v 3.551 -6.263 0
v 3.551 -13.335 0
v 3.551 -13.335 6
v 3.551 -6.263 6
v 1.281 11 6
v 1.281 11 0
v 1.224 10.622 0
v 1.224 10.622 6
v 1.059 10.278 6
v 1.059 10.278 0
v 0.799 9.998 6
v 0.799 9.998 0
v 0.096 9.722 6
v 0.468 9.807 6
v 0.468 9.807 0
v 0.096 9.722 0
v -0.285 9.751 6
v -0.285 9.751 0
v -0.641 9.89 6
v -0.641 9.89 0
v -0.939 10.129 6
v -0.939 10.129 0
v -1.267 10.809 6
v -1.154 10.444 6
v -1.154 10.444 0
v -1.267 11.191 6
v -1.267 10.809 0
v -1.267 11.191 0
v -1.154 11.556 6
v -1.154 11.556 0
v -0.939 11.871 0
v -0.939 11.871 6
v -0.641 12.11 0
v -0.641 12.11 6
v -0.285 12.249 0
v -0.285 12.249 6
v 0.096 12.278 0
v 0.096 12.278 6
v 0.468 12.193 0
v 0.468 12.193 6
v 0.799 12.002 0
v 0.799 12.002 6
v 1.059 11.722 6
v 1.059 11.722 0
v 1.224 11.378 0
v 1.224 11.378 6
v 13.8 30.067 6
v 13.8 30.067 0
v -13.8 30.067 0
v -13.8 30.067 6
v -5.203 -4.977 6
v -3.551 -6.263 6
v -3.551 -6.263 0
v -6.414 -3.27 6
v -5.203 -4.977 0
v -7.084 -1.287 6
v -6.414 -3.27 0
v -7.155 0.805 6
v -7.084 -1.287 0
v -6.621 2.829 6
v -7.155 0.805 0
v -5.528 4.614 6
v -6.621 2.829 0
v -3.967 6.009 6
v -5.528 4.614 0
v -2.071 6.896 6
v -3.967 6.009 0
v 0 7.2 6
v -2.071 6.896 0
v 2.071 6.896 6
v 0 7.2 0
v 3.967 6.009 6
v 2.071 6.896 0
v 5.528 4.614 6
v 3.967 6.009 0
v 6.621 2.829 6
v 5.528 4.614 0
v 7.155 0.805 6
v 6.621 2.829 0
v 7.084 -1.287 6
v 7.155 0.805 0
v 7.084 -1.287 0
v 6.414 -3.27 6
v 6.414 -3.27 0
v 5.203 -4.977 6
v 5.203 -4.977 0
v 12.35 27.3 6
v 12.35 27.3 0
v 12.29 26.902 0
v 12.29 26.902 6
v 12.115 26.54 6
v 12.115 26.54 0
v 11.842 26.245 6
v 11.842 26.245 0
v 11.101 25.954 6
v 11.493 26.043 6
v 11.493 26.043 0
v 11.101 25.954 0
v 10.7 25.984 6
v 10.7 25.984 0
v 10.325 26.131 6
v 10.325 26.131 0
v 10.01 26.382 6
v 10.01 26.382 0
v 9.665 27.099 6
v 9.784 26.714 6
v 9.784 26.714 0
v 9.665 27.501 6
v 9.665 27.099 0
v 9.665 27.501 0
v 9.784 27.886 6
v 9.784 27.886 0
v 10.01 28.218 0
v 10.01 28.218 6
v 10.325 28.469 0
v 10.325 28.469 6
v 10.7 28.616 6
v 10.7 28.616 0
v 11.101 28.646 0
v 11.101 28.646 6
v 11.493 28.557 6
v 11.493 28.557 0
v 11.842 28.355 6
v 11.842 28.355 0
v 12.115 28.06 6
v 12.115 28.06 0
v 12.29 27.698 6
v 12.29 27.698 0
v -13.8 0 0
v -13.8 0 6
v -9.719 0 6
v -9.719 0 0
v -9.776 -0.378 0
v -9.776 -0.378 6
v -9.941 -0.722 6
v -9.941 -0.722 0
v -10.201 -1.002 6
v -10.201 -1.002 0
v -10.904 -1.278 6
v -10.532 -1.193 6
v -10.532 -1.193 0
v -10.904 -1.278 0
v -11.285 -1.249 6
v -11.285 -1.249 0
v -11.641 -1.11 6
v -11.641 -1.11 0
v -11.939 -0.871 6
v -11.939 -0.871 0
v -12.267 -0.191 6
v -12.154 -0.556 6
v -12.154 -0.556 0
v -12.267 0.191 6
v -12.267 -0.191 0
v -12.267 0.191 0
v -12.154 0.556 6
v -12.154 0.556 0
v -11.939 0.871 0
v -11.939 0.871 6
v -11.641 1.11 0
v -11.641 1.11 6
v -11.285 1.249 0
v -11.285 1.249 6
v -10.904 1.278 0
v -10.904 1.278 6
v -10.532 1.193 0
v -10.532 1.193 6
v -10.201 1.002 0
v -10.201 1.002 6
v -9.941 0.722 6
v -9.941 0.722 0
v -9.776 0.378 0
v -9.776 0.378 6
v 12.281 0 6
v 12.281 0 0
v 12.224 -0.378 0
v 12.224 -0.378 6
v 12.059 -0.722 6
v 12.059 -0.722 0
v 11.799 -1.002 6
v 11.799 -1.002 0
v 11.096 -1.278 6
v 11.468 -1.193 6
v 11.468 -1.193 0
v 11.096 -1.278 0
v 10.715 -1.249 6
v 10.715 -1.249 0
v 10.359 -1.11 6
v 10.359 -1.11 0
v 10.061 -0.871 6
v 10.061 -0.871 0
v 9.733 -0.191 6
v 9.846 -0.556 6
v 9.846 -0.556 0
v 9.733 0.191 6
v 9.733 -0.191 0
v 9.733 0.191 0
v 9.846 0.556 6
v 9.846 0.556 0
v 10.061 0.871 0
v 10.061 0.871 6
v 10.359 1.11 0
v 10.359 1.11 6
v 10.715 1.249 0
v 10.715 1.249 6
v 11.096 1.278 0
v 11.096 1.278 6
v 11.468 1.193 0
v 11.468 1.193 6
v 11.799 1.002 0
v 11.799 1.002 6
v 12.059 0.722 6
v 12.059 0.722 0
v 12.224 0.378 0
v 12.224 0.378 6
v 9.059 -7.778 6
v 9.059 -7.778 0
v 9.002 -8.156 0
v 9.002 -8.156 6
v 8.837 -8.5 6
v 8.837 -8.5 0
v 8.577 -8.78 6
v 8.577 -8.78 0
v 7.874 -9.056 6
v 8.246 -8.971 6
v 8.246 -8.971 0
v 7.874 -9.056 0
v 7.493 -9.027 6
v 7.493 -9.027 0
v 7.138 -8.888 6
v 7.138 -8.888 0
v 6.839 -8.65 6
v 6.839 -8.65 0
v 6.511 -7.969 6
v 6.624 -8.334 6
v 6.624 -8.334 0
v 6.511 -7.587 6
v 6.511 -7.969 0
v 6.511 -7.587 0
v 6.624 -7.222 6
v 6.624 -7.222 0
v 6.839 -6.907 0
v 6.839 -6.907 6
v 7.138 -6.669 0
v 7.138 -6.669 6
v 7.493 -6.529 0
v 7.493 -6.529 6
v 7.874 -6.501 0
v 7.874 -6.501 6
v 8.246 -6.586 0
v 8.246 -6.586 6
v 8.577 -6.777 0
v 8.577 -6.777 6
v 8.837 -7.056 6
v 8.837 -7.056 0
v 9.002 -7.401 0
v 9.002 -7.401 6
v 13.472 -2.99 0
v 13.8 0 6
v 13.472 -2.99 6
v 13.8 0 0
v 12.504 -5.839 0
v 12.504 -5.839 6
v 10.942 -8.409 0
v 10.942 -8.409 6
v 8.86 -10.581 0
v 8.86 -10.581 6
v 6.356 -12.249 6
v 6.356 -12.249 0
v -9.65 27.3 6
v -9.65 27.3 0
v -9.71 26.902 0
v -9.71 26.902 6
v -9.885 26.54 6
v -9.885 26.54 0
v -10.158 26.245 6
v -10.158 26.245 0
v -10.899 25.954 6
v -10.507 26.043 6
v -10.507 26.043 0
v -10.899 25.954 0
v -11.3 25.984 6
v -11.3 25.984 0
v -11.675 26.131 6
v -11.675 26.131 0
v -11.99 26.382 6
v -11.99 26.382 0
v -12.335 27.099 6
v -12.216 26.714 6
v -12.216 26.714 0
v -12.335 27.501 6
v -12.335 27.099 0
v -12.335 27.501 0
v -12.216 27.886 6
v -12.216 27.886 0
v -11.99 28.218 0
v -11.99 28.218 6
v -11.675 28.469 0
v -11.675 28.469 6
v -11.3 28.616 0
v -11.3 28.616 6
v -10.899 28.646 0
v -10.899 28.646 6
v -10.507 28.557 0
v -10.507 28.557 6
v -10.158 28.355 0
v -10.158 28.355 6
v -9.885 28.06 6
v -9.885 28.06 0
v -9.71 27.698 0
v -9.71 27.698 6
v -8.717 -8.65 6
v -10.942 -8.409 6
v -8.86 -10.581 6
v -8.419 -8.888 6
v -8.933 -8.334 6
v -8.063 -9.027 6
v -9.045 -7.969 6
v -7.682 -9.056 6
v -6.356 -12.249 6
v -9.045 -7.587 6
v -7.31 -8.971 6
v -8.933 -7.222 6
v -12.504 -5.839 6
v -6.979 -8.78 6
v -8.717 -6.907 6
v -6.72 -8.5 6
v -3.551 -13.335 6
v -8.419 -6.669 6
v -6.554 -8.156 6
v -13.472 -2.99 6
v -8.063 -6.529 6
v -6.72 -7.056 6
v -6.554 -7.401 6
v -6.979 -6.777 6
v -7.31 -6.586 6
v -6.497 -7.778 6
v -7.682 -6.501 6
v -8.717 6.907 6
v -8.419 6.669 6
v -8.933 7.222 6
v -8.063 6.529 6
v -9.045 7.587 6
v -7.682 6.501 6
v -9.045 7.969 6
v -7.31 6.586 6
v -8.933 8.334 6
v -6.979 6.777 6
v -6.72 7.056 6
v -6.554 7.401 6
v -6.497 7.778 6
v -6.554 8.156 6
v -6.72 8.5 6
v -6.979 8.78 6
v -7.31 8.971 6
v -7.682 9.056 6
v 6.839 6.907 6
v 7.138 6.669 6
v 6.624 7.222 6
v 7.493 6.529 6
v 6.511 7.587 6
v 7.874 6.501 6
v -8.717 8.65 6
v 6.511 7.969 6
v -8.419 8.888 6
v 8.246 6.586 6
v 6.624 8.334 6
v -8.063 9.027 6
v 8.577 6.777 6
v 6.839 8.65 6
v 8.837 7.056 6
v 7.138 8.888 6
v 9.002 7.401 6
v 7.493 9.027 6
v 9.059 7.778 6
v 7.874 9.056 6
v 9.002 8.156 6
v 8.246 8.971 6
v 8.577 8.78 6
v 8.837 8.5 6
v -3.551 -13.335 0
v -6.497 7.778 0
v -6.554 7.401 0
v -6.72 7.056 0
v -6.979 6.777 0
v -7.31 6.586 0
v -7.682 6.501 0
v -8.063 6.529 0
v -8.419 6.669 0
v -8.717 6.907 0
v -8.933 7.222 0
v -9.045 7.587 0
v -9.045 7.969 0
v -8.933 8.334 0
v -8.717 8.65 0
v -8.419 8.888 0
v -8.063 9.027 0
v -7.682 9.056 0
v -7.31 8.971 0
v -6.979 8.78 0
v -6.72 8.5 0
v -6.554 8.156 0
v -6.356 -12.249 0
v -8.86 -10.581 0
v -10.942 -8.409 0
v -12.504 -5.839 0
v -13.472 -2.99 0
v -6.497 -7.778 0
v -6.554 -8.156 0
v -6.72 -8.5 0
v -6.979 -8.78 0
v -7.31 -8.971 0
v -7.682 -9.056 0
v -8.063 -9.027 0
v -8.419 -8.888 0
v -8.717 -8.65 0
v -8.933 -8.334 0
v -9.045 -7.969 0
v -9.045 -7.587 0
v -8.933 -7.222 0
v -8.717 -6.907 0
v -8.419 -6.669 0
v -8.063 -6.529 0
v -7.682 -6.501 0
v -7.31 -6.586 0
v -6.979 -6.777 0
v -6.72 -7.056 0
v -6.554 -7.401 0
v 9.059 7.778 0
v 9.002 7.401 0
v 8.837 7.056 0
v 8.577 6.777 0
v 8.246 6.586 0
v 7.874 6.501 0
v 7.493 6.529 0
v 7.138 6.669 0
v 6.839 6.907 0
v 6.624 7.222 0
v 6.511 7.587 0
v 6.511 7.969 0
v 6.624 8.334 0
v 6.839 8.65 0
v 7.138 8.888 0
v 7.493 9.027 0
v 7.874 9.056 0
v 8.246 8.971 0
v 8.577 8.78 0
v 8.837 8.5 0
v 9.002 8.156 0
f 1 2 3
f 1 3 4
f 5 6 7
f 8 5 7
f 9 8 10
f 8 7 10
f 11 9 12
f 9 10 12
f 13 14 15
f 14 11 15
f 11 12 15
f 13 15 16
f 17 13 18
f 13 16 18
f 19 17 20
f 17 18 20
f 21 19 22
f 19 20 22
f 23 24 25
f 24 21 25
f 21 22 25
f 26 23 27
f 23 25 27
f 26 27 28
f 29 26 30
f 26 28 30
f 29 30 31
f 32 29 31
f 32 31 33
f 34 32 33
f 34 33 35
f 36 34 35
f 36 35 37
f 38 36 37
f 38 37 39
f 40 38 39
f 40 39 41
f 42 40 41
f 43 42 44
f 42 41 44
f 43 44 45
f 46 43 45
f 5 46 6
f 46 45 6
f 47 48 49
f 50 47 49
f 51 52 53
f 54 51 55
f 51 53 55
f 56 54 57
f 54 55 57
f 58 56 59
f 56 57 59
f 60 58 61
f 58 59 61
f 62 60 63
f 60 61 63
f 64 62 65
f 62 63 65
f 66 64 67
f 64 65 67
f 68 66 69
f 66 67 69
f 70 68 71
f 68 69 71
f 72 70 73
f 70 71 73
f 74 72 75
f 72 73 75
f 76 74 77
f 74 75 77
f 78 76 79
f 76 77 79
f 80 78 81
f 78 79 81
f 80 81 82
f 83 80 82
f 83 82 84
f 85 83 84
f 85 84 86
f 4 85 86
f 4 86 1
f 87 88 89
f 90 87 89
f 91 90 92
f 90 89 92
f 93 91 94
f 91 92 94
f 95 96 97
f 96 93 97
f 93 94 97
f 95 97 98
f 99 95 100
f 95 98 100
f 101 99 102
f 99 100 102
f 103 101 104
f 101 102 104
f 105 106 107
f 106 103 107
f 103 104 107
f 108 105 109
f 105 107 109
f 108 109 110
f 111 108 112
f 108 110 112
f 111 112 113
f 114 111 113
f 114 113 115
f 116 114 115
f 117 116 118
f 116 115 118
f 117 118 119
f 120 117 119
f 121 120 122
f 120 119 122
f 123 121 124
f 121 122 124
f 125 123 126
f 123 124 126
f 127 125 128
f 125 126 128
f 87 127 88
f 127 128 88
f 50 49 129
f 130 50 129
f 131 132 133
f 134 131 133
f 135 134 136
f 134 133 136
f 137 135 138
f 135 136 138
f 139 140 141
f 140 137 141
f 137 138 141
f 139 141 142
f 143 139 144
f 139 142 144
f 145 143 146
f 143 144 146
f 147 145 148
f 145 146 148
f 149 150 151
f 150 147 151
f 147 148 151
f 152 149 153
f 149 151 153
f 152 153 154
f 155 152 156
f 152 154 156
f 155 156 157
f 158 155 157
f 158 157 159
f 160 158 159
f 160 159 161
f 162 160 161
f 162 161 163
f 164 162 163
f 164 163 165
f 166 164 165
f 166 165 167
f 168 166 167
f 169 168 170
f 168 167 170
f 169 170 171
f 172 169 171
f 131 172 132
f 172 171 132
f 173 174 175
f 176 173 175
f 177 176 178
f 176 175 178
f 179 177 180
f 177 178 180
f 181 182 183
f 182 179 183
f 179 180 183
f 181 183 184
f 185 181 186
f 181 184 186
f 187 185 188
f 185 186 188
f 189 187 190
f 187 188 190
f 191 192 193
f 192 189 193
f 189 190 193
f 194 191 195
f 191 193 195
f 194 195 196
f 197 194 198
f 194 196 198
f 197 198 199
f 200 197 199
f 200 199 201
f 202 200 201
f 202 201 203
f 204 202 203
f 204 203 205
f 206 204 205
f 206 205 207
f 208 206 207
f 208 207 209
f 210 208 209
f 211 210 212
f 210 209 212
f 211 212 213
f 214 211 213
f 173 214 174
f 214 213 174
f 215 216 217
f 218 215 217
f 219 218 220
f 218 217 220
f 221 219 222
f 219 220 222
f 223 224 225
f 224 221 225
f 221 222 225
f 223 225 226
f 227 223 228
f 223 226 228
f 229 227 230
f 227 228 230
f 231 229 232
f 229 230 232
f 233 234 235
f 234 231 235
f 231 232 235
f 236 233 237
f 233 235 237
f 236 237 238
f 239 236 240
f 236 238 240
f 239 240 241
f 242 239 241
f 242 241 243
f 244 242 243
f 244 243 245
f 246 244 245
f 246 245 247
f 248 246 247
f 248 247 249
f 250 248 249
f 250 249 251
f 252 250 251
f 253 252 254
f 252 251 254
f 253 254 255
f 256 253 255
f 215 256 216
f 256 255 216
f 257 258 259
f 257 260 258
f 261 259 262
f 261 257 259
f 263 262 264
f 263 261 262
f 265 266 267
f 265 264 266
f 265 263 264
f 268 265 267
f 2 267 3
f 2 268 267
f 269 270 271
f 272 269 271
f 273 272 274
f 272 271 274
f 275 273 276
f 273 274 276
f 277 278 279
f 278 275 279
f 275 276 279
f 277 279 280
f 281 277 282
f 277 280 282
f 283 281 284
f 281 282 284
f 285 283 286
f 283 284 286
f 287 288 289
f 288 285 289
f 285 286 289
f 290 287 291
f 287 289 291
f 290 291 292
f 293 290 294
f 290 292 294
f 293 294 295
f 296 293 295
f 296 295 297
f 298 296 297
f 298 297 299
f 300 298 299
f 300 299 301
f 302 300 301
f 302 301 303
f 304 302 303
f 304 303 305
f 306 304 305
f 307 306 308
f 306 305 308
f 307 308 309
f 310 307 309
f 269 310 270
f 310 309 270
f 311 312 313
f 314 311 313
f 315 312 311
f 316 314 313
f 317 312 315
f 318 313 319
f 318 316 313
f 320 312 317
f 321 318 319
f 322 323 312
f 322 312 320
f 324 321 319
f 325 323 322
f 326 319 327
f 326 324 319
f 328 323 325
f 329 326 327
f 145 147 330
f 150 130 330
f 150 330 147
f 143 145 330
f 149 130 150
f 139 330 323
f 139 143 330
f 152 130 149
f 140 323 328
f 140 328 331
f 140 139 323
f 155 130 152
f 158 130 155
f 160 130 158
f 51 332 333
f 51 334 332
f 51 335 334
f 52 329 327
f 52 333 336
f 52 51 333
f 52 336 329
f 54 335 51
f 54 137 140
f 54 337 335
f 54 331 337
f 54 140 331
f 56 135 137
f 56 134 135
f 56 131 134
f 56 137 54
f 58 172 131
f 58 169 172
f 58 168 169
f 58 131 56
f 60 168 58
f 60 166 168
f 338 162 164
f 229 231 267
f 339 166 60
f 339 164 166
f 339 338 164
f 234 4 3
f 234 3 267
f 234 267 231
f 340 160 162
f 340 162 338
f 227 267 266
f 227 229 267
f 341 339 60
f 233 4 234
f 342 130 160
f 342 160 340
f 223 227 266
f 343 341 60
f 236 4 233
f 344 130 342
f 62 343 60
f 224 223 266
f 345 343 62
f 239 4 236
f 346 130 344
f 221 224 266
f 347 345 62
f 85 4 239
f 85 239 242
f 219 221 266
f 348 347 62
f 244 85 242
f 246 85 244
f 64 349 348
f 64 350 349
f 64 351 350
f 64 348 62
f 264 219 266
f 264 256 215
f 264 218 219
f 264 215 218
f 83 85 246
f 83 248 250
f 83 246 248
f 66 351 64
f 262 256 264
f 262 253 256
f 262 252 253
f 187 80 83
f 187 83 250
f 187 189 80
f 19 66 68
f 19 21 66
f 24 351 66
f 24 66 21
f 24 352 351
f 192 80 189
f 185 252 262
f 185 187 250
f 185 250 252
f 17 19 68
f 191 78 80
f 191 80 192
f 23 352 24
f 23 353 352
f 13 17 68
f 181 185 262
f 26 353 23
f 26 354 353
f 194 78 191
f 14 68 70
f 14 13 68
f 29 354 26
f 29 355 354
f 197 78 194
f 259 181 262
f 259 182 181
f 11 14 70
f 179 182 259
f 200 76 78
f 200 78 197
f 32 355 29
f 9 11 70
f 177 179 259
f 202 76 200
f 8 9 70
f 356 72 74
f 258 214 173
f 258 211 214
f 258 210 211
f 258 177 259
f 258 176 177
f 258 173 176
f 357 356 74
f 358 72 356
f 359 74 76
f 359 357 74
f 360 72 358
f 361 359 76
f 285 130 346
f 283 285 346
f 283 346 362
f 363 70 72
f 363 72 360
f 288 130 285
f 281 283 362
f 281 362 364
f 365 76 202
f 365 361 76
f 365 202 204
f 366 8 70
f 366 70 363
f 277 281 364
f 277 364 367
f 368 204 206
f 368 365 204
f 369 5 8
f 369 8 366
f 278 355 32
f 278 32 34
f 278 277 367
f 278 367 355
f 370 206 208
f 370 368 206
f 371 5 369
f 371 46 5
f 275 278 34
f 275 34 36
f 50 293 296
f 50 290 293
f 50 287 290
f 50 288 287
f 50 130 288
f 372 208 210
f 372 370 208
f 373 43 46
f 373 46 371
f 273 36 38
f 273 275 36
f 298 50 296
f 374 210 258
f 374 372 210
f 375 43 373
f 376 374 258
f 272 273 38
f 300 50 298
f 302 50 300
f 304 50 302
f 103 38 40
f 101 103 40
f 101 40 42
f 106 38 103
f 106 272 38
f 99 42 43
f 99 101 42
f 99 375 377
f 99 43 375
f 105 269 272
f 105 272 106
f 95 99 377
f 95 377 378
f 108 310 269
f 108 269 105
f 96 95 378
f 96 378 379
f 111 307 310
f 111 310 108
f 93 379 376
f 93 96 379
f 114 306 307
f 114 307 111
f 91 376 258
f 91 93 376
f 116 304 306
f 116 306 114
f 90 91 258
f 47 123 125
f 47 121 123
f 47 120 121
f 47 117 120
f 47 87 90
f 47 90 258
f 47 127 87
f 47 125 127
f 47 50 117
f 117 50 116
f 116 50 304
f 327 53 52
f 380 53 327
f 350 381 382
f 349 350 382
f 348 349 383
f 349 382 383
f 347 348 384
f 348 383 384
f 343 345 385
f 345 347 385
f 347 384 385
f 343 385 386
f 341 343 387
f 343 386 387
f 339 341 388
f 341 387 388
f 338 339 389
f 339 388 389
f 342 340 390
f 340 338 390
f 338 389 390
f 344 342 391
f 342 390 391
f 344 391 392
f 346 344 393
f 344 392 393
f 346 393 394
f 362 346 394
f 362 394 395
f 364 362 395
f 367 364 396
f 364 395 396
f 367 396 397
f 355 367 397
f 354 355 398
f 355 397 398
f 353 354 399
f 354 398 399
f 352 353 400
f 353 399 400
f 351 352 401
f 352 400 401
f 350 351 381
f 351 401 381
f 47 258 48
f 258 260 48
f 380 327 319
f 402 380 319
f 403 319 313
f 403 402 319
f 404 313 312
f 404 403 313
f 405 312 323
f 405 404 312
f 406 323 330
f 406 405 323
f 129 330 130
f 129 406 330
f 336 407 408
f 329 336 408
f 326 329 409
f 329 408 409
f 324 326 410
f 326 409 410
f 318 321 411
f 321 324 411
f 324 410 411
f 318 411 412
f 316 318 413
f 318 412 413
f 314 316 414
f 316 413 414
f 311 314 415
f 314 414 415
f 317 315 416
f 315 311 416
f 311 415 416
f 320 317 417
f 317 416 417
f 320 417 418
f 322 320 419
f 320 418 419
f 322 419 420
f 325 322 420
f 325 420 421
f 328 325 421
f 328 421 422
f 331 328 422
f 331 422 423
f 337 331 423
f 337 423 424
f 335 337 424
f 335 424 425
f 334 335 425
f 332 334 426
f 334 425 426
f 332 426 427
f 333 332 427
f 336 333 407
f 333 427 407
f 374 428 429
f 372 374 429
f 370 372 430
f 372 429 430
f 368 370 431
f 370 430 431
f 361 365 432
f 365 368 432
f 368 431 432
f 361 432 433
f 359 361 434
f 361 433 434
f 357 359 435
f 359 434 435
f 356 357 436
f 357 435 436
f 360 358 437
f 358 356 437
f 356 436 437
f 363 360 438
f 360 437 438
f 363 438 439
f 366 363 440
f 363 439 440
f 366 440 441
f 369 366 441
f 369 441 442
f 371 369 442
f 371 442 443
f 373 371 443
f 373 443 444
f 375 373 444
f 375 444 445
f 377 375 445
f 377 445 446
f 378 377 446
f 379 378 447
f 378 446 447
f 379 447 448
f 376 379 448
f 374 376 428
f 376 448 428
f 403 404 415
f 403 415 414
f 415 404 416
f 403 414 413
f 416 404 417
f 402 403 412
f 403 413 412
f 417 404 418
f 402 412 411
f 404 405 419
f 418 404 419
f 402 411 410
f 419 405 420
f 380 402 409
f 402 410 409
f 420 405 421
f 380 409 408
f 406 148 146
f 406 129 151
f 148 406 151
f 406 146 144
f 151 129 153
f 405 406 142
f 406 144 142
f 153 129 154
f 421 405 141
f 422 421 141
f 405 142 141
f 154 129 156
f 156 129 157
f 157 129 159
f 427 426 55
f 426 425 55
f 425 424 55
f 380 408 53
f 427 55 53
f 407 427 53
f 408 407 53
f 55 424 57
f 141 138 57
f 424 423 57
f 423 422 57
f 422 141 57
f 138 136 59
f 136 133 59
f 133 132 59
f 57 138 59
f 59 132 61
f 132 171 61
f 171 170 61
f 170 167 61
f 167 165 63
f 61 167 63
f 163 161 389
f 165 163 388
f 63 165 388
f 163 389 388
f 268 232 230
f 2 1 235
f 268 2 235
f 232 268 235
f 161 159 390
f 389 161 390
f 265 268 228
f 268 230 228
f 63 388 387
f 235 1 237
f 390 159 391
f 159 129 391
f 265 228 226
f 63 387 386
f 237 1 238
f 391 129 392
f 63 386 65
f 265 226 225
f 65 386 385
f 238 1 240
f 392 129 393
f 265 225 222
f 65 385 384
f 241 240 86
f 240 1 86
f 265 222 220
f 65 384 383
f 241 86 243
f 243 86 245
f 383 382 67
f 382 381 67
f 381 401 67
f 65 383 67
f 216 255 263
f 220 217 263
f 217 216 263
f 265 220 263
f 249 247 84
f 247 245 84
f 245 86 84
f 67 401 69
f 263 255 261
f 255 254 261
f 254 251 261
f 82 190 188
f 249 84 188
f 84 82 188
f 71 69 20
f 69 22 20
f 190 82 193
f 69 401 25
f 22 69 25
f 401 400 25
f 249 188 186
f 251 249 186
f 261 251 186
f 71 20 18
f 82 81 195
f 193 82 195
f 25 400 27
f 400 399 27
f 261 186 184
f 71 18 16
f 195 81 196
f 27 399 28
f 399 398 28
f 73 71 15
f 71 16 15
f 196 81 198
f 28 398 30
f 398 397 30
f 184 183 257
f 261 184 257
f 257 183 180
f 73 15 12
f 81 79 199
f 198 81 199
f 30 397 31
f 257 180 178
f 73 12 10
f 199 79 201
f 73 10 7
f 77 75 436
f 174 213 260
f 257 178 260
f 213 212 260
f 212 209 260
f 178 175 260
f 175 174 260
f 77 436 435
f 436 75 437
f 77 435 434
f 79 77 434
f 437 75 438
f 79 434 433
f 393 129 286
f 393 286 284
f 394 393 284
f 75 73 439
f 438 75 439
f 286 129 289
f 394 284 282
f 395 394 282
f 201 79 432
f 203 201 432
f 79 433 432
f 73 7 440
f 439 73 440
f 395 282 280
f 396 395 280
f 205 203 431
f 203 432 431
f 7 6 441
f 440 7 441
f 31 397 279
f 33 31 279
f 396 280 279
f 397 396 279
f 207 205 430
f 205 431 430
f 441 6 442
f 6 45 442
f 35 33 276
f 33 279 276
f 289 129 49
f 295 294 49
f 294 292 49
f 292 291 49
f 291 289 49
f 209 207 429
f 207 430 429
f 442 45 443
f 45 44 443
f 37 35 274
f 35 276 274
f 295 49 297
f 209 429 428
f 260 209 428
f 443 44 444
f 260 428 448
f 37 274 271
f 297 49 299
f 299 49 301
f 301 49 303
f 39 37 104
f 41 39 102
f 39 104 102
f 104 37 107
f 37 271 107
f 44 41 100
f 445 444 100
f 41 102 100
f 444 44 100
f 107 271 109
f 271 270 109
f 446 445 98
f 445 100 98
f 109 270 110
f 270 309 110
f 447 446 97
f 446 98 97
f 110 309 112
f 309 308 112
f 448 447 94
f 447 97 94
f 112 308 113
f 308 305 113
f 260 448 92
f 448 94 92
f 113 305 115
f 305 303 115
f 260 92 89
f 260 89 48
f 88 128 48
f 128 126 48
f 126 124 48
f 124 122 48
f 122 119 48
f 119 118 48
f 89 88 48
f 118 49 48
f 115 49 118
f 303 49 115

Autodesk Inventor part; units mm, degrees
ref_plane "YZ Plane" through (0, 0, 0) normal (1, 0, 0) x (0, 1, 0)
ref_plane "XZ Plane" through (0, 0, 0) normal (0, 1, 0) x (-1, 0, 0)
ref_plane "XY Plane" through (0, 0, 0) normal (0, 0, 1) x (1, 0, 0)
ref_plane "작업 평면1" through (0, 0, 0) normal (0, 0, 1) x (1, 0, 0)
sketch "스케치1" plane through (0, 0, 0) normal (0, 0, 1) x (1, 0, 0)
  line L0 (3.5511, -14.2422) -> (3.5511, 14.2422) projected
  line L1 (-3.5511, 14.2422) -> (-3.5511, -14.2422) projected
  line L2 (-3.5511, -14.2422) -> (3.5511, -14.2422) projected
  circle A0 centre (0, 0) radius 13.8 projected
  line L3 (3.5511, 14.2422) -> (-3.5511, 14.2422) projected
  line L4 (13.8, 0) -> (13.8, 30.0667) projected
  line L5 (13.8, 30.0667) -> (-13.8, 30.0667) projected
  line L6 (-13.8, 30.0667) -> (-13.8, 0) projected
  circle A1 centre (0, 0) radius 13.8 projected
  circle A2 centre (0, 0) radius 7.2 projected
  circle A3 centre (0, -11) radius 1.2812 projected
  circle A4 centre (-7.7782, -7.7782) radius 1.2812 projected
  circle A5 centre (-11, 0) radius 1.2812 projected
  circle A6 centre (-7.7782, 7.7782) radius 1.2812 projected
  circle A7 centre (0, 11) radius 1.2812 projected
  circle A8 centre (7.7782, 7.7782) radius 1.2812 projected
  circle A9 centre (11, 0) radius 1.2812 projected
  circle A10 centre (7.7782, -7.7782) radius 1.2812 projected
  circle A11 centre (11, 27.3) radius 1.35 projected
  circle A12 centre (-11, 27.3) radius 1.35 projected
  point P0 (0, 0)
  point P1 (3.5511, -6.2634)
  point P2 (3.5511, -13.3353)
  point P3 (-3.5511, -13.3353)
  point P4 (-3.5511, -6.2634)
extrude "돌출1" add sketch "스케치1" along normal blind 6 contours L0 A2 A0 | A0 L1 A2 | A0 L0 L3 L1 L6 L5 L4 | A2 L1 A0 L0 | A0 L1 L3 L0 picked at (-2.7821, 10.0973)
properties part number "_thigh_2"
